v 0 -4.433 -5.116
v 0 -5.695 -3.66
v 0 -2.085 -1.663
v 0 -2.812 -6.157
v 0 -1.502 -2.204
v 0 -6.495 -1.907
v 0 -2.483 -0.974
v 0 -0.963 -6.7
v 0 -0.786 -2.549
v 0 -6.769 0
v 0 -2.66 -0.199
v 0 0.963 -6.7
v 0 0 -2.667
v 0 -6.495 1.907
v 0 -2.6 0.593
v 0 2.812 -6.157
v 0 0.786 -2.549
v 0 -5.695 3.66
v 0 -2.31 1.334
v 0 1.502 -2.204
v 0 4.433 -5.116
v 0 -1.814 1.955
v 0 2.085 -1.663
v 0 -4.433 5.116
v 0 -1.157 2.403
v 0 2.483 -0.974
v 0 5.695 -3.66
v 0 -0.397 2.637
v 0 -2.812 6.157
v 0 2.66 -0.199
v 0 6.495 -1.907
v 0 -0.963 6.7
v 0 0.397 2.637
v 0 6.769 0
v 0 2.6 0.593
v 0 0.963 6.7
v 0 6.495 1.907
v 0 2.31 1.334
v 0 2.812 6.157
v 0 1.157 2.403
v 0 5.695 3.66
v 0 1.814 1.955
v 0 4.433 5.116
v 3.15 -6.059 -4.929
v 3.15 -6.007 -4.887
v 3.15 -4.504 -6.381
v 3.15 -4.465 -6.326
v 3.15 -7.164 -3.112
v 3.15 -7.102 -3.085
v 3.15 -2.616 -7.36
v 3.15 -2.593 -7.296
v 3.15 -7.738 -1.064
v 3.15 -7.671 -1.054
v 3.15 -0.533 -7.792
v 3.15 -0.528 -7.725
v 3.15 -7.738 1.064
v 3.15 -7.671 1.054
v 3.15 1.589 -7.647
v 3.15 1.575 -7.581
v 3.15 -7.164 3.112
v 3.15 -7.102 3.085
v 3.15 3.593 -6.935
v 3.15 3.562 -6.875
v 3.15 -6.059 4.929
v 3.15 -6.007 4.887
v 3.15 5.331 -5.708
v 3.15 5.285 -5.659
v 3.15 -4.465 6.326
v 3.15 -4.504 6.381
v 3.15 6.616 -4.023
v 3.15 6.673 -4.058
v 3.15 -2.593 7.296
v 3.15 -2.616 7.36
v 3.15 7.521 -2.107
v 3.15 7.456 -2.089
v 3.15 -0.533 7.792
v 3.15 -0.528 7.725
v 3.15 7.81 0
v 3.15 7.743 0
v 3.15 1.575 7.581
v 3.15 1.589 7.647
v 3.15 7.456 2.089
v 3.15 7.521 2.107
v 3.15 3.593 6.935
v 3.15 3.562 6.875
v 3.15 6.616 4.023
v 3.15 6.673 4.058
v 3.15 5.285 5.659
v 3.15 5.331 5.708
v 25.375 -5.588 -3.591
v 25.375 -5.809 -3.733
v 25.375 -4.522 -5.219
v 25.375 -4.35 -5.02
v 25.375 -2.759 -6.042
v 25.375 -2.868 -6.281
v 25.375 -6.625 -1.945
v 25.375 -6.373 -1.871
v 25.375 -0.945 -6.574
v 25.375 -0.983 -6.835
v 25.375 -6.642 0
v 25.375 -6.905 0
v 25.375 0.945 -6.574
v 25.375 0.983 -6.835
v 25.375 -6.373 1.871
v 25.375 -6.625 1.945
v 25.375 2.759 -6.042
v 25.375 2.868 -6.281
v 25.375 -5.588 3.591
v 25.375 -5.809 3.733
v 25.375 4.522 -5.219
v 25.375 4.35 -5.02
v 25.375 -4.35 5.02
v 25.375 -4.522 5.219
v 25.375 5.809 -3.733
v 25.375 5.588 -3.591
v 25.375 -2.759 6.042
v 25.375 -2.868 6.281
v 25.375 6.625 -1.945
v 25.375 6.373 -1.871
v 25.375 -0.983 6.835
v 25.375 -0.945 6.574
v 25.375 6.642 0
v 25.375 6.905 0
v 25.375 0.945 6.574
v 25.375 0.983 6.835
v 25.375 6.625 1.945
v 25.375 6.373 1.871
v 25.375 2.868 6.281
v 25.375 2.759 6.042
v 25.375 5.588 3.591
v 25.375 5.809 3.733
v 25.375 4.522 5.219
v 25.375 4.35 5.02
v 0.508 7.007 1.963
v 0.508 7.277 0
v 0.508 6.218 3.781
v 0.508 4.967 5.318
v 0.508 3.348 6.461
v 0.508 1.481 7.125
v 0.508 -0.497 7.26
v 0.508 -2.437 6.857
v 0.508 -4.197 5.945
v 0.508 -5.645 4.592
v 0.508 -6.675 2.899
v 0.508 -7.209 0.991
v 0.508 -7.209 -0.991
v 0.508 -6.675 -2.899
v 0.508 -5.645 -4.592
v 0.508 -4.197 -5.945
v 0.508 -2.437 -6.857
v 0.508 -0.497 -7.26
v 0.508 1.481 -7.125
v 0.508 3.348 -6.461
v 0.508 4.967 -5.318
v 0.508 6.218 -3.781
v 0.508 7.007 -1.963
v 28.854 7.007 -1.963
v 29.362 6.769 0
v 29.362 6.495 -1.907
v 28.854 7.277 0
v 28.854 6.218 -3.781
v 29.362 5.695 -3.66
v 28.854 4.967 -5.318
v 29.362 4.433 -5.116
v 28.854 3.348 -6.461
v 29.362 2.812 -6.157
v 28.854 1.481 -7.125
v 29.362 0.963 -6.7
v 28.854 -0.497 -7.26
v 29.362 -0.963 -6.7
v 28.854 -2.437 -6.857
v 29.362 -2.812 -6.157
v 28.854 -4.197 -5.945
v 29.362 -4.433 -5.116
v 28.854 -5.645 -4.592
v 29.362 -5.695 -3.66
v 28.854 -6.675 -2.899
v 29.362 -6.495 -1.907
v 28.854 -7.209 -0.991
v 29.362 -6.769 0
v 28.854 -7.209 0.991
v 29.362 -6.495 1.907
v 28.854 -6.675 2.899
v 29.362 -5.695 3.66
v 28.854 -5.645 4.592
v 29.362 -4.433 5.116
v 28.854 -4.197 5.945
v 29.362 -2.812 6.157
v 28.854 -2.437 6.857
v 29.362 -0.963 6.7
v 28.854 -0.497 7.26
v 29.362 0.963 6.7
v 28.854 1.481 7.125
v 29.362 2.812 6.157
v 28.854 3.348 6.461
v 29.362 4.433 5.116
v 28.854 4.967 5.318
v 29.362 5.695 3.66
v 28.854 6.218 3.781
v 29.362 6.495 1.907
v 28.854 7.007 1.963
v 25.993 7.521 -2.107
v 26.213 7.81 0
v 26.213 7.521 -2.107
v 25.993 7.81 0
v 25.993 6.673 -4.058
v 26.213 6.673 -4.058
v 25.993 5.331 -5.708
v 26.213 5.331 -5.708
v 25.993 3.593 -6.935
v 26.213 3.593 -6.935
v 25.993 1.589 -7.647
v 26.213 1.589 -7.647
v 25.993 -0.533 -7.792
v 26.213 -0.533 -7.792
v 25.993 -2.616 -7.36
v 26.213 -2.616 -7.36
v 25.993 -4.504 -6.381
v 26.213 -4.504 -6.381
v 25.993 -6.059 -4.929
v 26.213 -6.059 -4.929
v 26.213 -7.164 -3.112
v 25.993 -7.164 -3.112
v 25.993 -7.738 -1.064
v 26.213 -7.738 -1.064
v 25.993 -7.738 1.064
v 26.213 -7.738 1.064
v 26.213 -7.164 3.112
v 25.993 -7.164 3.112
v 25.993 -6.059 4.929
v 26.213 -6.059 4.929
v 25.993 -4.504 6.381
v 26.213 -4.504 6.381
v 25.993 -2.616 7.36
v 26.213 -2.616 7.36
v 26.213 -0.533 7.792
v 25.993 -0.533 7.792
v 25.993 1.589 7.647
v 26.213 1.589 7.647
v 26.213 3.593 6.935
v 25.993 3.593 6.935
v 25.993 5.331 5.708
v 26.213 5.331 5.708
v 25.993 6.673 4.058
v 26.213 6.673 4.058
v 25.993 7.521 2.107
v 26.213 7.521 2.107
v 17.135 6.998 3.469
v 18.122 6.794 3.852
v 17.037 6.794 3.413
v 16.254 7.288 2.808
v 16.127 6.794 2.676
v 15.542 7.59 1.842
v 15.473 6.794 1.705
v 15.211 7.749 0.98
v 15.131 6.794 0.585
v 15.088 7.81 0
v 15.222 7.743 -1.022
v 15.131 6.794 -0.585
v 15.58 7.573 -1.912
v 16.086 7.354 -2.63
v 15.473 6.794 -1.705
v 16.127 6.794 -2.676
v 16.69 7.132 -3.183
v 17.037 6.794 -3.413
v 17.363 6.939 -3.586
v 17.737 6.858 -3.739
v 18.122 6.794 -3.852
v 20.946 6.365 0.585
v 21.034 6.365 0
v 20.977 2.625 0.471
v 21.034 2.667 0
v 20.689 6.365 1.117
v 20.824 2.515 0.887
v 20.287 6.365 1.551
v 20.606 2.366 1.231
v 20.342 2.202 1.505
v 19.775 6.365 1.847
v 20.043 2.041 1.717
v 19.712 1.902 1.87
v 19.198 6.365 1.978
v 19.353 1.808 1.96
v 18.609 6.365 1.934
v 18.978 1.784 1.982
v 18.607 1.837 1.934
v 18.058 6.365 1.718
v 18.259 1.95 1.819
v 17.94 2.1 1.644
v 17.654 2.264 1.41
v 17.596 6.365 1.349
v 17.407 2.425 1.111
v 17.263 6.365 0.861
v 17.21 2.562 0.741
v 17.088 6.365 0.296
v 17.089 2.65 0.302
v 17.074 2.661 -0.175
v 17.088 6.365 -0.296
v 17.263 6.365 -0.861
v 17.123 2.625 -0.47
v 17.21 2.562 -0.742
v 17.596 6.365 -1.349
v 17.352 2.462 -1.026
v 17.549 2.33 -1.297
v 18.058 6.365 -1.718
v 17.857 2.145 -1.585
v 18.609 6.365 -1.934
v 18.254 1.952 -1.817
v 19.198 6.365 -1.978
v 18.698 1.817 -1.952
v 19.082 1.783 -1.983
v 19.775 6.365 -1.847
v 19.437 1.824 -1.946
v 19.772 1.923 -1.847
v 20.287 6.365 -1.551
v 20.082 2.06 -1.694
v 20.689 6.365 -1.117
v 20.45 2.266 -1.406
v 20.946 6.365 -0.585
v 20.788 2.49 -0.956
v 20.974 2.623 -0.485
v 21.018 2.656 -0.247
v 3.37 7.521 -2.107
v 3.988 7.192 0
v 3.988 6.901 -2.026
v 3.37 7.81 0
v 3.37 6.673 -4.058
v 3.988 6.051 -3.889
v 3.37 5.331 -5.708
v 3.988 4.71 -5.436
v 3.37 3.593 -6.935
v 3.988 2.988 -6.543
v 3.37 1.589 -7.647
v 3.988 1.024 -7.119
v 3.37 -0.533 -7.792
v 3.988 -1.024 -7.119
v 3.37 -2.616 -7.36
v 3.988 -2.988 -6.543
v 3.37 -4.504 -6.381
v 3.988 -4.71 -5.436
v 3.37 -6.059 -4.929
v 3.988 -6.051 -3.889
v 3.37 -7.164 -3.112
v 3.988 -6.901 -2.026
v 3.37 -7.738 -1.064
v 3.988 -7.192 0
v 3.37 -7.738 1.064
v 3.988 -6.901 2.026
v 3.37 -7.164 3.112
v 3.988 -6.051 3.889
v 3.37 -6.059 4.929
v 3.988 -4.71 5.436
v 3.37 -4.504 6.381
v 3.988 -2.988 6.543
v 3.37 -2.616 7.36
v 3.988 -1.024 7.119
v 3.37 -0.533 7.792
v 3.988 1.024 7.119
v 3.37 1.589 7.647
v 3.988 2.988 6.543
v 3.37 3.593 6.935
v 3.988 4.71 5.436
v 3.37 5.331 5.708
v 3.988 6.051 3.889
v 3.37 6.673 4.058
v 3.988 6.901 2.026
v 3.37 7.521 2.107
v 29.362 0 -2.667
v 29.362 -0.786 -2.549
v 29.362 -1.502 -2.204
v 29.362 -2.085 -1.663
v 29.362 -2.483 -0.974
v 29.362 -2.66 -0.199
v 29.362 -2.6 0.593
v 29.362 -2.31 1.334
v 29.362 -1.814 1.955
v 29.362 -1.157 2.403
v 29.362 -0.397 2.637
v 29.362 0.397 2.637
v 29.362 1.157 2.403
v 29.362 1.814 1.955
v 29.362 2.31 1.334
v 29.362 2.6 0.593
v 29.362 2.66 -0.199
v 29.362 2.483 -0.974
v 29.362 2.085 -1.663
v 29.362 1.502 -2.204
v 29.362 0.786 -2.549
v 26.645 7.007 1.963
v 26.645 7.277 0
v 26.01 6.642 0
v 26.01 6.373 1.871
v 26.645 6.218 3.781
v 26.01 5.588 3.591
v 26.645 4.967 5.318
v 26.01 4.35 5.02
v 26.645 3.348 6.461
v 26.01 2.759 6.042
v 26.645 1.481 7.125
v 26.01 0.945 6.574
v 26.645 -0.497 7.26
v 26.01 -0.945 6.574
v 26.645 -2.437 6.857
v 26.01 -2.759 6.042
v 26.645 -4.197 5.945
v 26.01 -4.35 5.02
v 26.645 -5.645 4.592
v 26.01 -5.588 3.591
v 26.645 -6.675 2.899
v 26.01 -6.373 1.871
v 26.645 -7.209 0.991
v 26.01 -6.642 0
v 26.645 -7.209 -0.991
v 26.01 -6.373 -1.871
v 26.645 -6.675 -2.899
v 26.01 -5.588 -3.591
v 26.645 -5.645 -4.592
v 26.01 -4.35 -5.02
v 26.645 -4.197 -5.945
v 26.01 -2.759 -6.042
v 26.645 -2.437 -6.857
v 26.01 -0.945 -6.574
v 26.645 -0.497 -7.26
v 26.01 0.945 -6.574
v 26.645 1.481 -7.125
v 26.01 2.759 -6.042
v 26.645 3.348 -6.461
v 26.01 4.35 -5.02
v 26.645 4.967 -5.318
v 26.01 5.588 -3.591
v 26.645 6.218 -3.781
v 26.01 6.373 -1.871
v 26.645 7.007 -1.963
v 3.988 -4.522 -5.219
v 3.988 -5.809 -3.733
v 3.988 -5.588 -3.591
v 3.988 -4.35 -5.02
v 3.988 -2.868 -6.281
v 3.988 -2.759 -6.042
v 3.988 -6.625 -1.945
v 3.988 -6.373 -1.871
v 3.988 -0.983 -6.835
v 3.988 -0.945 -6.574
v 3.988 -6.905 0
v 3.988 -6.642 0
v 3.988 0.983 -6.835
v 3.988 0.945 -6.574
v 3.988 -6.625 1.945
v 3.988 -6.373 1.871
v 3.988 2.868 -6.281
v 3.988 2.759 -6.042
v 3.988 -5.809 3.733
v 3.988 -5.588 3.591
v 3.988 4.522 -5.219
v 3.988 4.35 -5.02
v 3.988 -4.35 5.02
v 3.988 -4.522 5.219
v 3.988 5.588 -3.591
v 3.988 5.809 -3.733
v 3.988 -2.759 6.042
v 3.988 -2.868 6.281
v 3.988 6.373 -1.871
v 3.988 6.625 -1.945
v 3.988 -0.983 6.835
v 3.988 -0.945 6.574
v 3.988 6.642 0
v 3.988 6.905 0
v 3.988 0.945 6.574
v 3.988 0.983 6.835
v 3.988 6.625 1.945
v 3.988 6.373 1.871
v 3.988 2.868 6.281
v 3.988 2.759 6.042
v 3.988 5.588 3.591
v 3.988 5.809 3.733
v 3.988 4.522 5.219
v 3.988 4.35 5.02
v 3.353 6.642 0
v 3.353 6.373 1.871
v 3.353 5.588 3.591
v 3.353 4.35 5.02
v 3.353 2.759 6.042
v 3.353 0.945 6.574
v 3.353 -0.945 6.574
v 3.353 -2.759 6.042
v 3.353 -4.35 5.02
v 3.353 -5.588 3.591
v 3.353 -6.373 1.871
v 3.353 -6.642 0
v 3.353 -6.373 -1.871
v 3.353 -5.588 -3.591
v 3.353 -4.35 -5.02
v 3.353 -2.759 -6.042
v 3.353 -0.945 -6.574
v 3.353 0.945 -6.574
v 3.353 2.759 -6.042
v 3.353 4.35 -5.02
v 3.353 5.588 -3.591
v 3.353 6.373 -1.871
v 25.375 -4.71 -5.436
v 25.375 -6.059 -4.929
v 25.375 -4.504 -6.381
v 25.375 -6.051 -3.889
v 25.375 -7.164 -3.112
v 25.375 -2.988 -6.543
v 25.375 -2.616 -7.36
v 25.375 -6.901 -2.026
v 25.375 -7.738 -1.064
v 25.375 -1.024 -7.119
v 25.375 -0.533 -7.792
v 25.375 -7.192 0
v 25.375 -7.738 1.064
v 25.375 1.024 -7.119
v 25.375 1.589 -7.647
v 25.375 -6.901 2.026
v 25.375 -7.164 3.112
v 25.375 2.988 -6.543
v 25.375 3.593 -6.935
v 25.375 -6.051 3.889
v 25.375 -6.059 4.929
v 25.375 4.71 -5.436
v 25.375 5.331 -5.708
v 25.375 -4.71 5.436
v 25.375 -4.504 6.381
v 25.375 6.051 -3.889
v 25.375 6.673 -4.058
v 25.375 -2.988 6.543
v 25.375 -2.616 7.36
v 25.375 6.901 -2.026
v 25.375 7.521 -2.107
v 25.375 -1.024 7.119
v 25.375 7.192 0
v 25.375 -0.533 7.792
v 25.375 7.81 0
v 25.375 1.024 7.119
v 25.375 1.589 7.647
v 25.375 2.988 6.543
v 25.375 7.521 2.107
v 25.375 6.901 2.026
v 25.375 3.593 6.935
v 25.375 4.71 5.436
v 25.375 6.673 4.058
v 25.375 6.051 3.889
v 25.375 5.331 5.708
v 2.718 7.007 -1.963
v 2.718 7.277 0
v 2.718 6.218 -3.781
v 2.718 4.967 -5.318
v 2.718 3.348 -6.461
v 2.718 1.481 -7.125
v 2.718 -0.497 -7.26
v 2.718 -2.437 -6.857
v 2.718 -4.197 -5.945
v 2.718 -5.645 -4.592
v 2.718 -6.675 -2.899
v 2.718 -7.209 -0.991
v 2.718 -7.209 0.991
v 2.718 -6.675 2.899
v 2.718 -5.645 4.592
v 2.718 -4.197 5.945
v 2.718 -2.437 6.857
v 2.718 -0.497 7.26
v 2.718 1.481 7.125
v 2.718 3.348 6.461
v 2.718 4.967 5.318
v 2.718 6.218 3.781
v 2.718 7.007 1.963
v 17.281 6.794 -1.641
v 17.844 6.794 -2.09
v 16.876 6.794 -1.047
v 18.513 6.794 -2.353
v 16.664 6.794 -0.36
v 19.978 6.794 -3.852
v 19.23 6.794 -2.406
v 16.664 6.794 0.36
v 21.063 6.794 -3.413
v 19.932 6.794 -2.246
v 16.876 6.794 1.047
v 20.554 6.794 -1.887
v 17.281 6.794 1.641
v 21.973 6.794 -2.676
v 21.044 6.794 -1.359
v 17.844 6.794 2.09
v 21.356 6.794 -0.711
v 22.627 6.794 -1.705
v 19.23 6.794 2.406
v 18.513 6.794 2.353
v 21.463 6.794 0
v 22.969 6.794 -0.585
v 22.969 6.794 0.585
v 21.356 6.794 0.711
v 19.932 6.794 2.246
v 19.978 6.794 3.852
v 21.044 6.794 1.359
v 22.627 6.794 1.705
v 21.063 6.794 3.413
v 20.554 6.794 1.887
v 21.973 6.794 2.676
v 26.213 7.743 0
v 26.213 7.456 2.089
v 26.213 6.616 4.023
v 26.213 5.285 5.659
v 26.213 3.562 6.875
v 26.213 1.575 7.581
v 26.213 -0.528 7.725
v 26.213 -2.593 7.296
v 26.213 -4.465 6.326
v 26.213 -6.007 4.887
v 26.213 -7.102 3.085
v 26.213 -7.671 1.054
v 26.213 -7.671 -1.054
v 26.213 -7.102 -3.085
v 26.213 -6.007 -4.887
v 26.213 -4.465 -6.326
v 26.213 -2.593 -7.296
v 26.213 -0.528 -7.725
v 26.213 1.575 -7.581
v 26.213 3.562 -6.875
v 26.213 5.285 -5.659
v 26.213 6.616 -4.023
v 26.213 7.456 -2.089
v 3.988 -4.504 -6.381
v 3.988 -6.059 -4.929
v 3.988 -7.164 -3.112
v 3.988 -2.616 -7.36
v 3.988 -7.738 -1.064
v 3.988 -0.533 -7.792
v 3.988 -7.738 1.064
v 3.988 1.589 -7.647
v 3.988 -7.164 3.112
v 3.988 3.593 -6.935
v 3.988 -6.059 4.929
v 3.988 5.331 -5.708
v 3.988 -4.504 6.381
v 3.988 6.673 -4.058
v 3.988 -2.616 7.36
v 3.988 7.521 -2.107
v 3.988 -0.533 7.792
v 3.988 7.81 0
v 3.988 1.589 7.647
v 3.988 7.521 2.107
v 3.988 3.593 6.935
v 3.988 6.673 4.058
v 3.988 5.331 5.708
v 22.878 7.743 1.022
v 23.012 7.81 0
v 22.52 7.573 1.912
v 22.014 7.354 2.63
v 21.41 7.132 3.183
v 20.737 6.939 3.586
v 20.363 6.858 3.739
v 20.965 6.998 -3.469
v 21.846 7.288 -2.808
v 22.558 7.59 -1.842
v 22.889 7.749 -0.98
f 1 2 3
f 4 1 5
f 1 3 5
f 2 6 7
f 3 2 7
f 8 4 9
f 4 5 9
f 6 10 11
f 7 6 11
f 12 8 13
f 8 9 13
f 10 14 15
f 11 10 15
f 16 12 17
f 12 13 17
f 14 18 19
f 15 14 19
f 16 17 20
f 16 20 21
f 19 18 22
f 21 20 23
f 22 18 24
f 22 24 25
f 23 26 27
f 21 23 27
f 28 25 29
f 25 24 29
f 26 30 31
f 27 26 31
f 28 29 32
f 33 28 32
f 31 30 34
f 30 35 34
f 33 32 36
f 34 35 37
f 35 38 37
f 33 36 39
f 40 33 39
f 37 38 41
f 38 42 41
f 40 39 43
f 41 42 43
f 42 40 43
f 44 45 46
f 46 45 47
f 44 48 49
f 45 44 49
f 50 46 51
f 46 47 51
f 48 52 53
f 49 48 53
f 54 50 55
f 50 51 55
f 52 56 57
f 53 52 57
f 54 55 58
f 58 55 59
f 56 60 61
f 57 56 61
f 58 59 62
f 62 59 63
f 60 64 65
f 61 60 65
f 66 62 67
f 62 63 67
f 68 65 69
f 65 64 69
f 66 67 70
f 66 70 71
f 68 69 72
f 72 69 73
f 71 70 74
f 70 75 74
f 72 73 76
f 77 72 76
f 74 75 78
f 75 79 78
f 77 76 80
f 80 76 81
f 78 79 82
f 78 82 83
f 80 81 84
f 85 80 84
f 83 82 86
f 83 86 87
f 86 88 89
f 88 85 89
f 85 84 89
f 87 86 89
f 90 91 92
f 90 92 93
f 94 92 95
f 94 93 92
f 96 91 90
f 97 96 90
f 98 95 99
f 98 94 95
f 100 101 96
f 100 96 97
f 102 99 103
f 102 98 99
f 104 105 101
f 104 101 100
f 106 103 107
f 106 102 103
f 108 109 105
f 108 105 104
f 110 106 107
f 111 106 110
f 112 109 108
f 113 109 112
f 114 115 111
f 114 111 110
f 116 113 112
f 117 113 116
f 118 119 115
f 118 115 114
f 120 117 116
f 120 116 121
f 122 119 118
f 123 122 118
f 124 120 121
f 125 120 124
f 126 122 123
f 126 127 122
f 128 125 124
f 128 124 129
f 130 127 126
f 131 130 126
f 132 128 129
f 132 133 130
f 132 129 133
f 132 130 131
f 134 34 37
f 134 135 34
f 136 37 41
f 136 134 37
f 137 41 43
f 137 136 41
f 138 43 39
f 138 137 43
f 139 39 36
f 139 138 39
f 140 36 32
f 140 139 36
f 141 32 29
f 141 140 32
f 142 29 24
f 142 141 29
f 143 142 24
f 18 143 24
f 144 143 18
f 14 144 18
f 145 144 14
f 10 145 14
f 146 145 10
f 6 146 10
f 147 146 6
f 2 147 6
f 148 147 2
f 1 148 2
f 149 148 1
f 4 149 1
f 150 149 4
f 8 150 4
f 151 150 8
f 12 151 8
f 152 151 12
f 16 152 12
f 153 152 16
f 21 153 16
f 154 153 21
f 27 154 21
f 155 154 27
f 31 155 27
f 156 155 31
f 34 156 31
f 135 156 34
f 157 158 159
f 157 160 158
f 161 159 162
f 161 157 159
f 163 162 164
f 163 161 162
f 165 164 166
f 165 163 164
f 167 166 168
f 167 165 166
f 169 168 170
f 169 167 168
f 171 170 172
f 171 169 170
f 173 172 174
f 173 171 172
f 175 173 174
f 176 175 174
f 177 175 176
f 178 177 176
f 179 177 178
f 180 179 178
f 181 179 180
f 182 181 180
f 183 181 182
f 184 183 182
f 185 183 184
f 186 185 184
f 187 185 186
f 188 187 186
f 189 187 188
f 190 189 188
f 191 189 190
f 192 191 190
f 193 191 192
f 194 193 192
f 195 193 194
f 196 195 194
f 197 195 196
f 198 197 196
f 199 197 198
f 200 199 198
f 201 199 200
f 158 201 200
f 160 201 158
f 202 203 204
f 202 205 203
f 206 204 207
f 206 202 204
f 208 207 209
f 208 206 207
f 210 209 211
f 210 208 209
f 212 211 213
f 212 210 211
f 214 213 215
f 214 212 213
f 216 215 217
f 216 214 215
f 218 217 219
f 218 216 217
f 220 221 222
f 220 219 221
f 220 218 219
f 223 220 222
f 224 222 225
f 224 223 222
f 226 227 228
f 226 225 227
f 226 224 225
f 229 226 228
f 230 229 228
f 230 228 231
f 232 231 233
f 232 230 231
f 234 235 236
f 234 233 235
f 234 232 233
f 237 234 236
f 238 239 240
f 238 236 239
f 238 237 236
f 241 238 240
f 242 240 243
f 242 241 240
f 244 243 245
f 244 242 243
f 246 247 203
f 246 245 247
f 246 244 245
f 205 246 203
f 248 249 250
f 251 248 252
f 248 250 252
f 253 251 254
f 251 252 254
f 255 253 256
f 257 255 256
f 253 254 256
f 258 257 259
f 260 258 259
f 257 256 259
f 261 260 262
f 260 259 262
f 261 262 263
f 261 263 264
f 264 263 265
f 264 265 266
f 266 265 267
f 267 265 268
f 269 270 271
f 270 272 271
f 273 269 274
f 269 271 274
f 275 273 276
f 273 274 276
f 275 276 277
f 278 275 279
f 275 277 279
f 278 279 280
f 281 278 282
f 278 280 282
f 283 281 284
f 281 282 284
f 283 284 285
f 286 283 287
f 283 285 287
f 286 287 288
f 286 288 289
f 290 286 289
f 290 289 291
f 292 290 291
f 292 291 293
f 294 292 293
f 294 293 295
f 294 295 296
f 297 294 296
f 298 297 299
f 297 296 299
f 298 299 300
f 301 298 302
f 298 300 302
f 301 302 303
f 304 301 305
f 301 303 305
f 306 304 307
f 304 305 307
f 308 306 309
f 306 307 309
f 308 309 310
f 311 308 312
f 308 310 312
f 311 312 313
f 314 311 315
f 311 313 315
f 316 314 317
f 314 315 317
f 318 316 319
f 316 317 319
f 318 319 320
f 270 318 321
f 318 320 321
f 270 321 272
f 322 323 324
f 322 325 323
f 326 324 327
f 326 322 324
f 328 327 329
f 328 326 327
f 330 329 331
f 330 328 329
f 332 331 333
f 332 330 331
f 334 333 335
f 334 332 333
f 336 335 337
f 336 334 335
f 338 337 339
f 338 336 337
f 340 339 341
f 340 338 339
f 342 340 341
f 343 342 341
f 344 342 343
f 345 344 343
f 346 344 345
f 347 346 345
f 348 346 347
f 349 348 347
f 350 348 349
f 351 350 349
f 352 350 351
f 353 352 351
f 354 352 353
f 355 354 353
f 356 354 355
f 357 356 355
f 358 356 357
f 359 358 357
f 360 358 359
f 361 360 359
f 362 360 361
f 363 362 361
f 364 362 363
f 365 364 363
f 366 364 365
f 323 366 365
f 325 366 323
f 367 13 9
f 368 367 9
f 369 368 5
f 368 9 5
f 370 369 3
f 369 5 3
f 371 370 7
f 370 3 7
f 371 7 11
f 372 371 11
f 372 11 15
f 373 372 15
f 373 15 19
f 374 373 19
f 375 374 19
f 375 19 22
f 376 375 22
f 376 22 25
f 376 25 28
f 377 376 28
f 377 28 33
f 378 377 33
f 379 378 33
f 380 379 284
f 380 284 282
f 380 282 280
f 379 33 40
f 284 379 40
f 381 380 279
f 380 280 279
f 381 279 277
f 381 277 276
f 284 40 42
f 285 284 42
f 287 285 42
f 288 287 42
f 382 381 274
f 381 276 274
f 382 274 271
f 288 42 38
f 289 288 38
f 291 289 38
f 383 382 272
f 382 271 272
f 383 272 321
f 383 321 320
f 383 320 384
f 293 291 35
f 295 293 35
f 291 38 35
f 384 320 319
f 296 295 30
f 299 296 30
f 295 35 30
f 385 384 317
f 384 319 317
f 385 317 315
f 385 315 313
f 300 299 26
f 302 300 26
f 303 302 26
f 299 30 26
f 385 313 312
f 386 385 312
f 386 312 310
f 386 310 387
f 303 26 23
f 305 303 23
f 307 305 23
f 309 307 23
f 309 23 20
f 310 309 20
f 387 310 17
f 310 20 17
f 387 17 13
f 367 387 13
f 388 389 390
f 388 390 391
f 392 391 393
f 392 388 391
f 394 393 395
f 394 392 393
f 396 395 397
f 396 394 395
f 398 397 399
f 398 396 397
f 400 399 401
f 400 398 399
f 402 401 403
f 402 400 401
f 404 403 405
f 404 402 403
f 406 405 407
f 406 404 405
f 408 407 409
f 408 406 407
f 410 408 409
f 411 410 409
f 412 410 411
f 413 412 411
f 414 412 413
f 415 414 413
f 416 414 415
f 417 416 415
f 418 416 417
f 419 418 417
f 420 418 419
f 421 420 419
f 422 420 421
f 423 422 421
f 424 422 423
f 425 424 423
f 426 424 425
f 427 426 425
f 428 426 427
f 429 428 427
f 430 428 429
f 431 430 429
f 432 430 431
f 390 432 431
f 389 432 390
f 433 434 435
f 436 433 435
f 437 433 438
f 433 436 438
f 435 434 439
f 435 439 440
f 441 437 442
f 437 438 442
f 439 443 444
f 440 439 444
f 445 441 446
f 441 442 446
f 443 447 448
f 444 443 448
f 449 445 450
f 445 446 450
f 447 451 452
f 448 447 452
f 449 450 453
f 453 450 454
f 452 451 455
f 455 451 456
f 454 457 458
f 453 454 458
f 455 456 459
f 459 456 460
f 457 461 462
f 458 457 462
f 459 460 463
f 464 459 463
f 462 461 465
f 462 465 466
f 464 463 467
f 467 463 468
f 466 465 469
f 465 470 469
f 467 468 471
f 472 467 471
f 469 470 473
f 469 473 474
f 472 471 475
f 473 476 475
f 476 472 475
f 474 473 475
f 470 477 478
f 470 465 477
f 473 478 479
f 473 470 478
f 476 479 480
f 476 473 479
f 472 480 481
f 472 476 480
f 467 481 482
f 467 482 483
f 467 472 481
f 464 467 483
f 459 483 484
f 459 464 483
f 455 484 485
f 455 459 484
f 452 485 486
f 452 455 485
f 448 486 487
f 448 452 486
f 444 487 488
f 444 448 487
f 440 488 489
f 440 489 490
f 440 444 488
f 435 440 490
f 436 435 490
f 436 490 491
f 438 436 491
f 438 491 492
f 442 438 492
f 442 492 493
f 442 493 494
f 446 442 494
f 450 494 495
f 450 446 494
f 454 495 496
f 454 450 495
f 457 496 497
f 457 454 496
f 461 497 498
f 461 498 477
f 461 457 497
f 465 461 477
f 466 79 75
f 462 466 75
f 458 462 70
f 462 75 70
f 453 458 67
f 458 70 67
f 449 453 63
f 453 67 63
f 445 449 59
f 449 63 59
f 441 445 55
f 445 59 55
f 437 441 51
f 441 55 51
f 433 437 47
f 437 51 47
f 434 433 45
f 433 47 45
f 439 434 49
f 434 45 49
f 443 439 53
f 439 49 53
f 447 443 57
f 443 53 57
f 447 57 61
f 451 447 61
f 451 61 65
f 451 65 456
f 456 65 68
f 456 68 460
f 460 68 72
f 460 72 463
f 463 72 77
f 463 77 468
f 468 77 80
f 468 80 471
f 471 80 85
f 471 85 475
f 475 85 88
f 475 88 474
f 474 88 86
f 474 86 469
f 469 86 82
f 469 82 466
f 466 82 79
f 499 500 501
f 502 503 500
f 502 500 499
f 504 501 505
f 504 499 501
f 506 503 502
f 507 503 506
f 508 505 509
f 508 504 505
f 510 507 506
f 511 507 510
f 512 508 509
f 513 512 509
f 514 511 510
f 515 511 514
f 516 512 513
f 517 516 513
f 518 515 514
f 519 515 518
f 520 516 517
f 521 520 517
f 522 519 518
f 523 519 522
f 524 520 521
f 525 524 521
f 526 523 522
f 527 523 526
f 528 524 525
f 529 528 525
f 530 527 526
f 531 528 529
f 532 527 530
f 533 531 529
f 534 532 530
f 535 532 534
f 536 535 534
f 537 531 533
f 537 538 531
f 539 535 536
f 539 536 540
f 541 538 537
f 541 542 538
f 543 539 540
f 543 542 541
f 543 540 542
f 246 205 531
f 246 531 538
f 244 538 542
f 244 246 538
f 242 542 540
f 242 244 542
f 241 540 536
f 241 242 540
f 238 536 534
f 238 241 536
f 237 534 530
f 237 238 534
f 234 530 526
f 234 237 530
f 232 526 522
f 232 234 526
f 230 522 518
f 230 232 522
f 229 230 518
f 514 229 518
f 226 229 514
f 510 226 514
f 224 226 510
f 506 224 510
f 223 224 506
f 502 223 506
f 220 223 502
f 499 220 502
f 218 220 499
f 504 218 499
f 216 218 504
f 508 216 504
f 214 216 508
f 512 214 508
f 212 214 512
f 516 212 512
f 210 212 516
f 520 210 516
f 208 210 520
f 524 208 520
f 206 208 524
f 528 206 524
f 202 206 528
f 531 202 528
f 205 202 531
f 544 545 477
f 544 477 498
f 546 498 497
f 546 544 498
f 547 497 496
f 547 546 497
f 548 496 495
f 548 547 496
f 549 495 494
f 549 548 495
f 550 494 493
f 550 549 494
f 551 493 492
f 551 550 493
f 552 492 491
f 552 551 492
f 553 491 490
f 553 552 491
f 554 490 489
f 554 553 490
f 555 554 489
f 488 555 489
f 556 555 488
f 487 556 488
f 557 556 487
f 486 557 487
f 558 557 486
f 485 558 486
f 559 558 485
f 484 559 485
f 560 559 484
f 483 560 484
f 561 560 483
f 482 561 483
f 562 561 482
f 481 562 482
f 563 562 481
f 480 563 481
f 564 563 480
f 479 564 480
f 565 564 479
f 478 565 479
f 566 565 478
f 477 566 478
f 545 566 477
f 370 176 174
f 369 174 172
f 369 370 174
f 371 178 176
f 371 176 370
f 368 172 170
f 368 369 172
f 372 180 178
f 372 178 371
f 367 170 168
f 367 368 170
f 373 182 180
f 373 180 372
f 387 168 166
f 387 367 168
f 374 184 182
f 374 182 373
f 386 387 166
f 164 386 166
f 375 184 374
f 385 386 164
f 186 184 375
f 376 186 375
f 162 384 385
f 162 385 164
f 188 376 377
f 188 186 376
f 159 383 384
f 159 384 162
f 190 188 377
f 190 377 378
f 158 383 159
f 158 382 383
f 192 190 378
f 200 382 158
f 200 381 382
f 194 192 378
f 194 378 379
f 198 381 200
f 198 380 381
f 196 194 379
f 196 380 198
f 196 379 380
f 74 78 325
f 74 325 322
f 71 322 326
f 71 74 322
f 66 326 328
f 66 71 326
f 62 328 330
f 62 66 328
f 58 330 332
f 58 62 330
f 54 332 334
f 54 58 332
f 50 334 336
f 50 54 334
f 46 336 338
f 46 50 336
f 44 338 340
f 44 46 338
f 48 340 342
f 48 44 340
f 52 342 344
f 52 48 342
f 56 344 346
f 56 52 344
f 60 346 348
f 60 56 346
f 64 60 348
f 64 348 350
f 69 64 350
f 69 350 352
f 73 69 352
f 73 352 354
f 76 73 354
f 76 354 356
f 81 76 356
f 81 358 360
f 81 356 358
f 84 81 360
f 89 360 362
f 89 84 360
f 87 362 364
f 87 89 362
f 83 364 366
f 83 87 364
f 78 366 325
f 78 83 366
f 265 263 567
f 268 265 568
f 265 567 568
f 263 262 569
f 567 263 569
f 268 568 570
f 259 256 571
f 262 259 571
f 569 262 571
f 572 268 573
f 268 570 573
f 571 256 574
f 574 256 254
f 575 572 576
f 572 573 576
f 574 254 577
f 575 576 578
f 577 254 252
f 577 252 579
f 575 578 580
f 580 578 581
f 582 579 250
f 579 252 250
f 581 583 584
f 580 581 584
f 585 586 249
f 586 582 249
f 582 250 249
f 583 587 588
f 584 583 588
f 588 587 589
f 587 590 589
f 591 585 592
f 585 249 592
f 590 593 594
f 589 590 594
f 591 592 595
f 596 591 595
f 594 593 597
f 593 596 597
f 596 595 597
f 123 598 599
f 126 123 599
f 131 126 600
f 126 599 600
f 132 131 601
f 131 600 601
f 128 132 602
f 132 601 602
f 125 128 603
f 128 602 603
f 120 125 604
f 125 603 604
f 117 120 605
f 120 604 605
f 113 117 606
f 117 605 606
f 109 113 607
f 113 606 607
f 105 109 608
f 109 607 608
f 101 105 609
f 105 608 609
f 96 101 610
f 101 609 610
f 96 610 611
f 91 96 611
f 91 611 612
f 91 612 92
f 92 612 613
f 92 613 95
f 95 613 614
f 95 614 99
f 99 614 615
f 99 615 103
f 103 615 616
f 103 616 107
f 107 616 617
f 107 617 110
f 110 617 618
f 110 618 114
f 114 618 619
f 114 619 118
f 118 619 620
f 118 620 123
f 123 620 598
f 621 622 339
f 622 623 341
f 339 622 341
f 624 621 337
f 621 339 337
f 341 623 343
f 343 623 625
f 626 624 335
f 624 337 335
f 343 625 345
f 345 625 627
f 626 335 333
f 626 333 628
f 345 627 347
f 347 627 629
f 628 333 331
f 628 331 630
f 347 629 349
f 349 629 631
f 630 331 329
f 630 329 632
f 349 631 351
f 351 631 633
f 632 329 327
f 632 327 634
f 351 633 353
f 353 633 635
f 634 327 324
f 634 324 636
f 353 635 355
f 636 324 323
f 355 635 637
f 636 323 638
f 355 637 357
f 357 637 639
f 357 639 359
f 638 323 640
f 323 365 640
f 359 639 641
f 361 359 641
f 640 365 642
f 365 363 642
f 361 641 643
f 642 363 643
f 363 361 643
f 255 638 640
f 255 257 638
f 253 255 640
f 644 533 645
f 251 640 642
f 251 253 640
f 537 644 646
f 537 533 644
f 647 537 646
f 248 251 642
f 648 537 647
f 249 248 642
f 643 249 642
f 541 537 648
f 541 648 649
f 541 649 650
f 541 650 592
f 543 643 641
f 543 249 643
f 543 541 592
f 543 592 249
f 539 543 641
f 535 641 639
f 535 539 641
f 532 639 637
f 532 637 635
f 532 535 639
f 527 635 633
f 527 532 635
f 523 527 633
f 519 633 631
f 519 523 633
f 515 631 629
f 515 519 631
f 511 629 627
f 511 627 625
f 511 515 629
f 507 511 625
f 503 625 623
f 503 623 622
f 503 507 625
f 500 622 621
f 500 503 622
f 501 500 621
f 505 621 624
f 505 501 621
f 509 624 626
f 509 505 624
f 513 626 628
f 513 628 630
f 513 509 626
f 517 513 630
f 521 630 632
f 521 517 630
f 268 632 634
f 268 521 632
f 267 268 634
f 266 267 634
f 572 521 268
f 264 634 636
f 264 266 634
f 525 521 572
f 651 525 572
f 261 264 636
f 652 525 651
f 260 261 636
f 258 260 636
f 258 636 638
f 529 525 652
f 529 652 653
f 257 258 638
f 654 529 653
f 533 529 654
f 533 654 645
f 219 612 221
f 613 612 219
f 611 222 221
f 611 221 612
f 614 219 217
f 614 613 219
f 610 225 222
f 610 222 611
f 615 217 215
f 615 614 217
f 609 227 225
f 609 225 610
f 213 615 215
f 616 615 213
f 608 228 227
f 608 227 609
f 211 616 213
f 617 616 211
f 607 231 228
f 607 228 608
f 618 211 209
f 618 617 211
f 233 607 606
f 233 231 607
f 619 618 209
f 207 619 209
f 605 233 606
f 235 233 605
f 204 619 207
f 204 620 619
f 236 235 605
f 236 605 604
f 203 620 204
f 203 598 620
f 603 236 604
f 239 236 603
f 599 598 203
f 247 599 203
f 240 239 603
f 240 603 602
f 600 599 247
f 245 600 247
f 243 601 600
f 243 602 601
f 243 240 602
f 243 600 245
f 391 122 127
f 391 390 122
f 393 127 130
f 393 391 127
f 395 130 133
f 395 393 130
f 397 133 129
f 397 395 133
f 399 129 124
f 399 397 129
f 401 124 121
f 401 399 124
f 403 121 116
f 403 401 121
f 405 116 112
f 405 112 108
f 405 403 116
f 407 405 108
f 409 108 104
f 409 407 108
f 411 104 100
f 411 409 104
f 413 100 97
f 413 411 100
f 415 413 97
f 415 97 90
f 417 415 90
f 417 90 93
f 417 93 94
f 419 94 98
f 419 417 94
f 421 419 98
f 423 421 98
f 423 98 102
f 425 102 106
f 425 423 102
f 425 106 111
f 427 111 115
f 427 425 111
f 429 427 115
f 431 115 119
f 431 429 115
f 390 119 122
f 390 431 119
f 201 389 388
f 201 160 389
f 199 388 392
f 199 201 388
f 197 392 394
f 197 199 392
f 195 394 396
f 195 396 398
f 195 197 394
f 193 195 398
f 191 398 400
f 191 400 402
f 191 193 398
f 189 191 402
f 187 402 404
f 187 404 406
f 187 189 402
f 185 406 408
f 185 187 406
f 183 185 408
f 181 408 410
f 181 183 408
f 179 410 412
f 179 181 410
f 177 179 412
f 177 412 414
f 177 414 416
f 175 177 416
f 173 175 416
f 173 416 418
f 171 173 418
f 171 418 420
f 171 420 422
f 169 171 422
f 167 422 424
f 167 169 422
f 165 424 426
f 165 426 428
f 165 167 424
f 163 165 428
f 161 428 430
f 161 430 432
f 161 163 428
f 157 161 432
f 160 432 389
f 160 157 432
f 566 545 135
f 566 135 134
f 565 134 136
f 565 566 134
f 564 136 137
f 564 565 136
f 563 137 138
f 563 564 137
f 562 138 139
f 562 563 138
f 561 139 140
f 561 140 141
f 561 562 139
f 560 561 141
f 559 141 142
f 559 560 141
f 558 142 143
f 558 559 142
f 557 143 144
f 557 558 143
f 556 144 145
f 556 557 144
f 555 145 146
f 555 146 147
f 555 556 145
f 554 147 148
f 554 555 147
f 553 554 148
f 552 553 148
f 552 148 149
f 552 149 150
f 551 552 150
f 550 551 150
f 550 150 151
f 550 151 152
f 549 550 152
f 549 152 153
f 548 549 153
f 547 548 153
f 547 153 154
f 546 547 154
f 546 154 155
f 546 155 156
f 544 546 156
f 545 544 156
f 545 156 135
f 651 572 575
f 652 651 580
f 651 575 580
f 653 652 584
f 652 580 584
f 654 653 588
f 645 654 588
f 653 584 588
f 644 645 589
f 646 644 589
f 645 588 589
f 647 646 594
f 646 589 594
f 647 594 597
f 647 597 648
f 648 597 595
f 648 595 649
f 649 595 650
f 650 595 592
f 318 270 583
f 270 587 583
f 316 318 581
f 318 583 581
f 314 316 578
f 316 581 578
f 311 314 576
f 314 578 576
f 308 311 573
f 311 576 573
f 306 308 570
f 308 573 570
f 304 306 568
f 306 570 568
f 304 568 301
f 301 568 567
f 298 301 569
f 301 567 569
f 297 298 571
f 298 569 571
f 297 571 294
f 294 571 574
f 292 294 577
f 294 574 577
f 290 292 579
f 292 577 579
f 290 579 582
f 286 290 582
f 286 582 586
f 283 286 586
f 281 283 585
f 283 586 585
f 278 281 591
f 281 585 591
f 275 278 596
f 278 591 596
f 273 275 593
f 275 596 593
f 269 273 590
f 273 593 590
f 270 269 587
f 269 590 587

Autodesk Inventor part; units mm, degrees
sketch "Sketch_1" plane through (0, 0, 0) normal (0, 0, 1) x (1, 0, 0)
  line L0 (29.3624, 0) -> (0, 0)
  line L1 (0, 0) -> (0, 6.7691)
  line L2 (0, 6.7691) -> (0.508, 7.2771)
  line L3 (0.508, 7.2771) -> (2.7178, 7.2771)
  line L4 (2.7178, 7.2771) -> (3.3528, 6.6421)
  line L5 (3.3528, 6.6421) -> (3.9878, 6.6421)
  line L6 (3.9878, 6.6421) -> (3.9878, 7.8105)
  line L7 (3.9878, 7.8105) -> (25.3746, 7.8105)
  line L8 (25.3746, 7.8105) -> (25.3746, 6.6421)
  line L9 (25.3746, 6.6421) -> (26.0096, 6.6421)
  line L10 (26.0096, 6.6421) -> (26.6446, 7.2771)
  line L11 (26.6446, 7.2771) -> (28.8544, 7.2771)
  line L12 (28.8544, 7.2771) -> (29.3624, 6.7691)
  line L13 (29.3624, 6.7691) -> (29.3624, 0)
  line L14 (29.3624, 0) -> (0, 0)
revolve "Revolution1" add sketch "Sketch_1" angle 360 about axis through (29.3624, 0, 0) along (1, 0, 0)
sketch "Sketch2" plane through (29.3624, 0, 0) normal (1, 0, 0) x (0, 0, -1)
  point P0 (0, 0)
hole "Hole1" at (29.3624, 0, 0) direction (-1, 0, 0) diameter 5.334 depth 29.3624
sketch "Sketch_6" plane through (0, 0, 0) normal (0, 0, 1) x (1, 0, 0)
  line L0 (19.05, 0) -> (19.05, 7.8105)
  line L1 (19.05, 7.8105) -> (23.0124, 7.8105)
  line L2 (23.0124, 7.8105) -> (23.0124, 6.7945)
  line L3 (23.0124, 6.7945) -> (21.463, 6.7945)
  line L4 (21.463, 6.7945) -> (21.0337, 6.3652)
  line L5 (21.0337, 6.3652) -> (21.0337, 0)
  line L6 (21.0337, 0) -> (19.05, 0)
  line L7 (19.05, 0) -> (19.05, 7.8105)
revolve "Revolution2" cut sketch "Sketch_6" angle 360 about axis through (19.05, 0, 0) along (0, -1, 0)
thread "Thread1" size "10-32 UNF" class "2B" standard "ANSI Unified Screw Threads" length 2.4257 offset 2.5862
sketch "Sketch_8" plane through (0, 0, 0) normal (0, 0, 1) x (1, 0, 0)
  line L0 (29.3624, 0) -> (-29.3624, 0)
  line L1 (24.8242, 6.6421) -> (25.1116, 6.6421)
  line L2 (25.1116, 6.6421) -> (26.2128, 7.7433)
  line L3 (26.2128, 7.7433) -> (26.2128, 7.8105)
  line L4 (26.2128, 7.8105) -> (25.9926, 7.8105)
  line L5 (25.9926, 7.8105) -> (24.8242, 6.6421)
revolve "Revolution3" add sketch "Sketch_8" angle 360 about axis through (29.3624, 0, 0) along (1, 0, 0)
sketch "Sketch_14" plane through (0, 0, 0) normal (0, 0, 1) x (1, 0, 0)
  line L0 (29.3624, 0) -> (-29.3624, 0)
  line L1 (3.1496, 7.7433) -> (4.2508, 6.6421)
  line L2 (4.2508, 6.6421) -> (4.5382, 6.6421)
  line L3 (4.5382, 6.6421) -> (3.3698, 7.8105)
  line L4 (3.3698, 7.8105) -> (3.1496, 7.8105)
  line L5 (3.1496, 7.8105) -> (3.1496, 7.7433)
revolve "Revolution4" add sketch "Sketch_14" angle 360 about axis through (29.3624, 0, 0) along (1, 0, 0)
ref_plane "ba2_XY" through (19.05, 7.8105, 0) normal (0, 0, 1) x (1, 0, 0)
ref_plane "ba2_YZ" through (19.05, 7.8105, 0) normal (1, 0, 0) x (0, 1, 0)
ref_plane "ba2_ZX" through (19.05, 7.8105, 0) normal (0, 1, 0) x (0, 0, 1)
ref_plane "centar_XY" through (14.6812, 0, 0) normal (1, 0, 0) x (0, 0, -1)
ref_plane "centar_YZ" through (14.6812, 0, 0) normal (0, 0, -1) x (0, 1, 0)
ref_plane "centar_ZX" through (14.6812, 0, 0) normal (0, 1, 0) x (1, 0, 0)
ref_plane "d1_XY" through (21.463, 6.7945, 0) normal (0, 0, 1) x (1, 0, 0)
ref_plane "d1_YZ" through (21.463, 6.7945, 0) normal (1, 0, 0) x (0, 1, 0)
ref_plane "d1_ZX" through (21.463, 6.7945, 0) normal (0, 1, 0) x (0, 0, 1)
ref_plane "d2_XY" through (16.637, 6.7945, 0) normal (0, 0, 1) x (1, 0, 0)
ref_plane "d2_YZ" through (16.637, 6.7945, 0) normal (1, 0, 0) x (0, 1, 0)
ref_plane "d2_ZX" through (16.637, 6.7945, 0) normal (0, 1, 0) x (0, 0, 1)
ref_plane "to_cyl_A_XY" through (2.7178, 0, 0) normal (1, 0, 0) x (0, 0, -1)
ref_plane "to_cyl_A_YZ" through (2.7178, 0, 0) normal (0, 0, -1) x (0, 1, 0)
ref_plane "to_cyl_A_ZX" through (2.7178, 0, 0) normal (0, 1, 0) x (1, 0, 0)
ref_plane "to_cyl_B_XY" through (26.6446, 0, 0) normal (1, 0, 0) x (0, 0, -1)
ref_plane "to_cyl_B_YZ" through (26.6446, 0, 0) normal (0, 0, -1) x (0, 1, 0)
ref_plane "to_cyl_B_ZX" through (26.6446, 0, 0) normal (0, 1, 0) x (1, 0, 0)
ref_plane "to_rod_A_XY" through (29.3624, 0, 0) normal (1, 0, 0) x (0, 0, -1)
ref_plane "to_rod_A_YZ" through (29.3624, 0, 0) normal (0, 0, -1) x (0, 1, 0)
ref_plane "to_rod_A_ZX" through (29.3624, 0, 0) normal (0, 1, 0) x (1, 0, 0)
properties part number "D-68355-XP--0" material "Steel"
